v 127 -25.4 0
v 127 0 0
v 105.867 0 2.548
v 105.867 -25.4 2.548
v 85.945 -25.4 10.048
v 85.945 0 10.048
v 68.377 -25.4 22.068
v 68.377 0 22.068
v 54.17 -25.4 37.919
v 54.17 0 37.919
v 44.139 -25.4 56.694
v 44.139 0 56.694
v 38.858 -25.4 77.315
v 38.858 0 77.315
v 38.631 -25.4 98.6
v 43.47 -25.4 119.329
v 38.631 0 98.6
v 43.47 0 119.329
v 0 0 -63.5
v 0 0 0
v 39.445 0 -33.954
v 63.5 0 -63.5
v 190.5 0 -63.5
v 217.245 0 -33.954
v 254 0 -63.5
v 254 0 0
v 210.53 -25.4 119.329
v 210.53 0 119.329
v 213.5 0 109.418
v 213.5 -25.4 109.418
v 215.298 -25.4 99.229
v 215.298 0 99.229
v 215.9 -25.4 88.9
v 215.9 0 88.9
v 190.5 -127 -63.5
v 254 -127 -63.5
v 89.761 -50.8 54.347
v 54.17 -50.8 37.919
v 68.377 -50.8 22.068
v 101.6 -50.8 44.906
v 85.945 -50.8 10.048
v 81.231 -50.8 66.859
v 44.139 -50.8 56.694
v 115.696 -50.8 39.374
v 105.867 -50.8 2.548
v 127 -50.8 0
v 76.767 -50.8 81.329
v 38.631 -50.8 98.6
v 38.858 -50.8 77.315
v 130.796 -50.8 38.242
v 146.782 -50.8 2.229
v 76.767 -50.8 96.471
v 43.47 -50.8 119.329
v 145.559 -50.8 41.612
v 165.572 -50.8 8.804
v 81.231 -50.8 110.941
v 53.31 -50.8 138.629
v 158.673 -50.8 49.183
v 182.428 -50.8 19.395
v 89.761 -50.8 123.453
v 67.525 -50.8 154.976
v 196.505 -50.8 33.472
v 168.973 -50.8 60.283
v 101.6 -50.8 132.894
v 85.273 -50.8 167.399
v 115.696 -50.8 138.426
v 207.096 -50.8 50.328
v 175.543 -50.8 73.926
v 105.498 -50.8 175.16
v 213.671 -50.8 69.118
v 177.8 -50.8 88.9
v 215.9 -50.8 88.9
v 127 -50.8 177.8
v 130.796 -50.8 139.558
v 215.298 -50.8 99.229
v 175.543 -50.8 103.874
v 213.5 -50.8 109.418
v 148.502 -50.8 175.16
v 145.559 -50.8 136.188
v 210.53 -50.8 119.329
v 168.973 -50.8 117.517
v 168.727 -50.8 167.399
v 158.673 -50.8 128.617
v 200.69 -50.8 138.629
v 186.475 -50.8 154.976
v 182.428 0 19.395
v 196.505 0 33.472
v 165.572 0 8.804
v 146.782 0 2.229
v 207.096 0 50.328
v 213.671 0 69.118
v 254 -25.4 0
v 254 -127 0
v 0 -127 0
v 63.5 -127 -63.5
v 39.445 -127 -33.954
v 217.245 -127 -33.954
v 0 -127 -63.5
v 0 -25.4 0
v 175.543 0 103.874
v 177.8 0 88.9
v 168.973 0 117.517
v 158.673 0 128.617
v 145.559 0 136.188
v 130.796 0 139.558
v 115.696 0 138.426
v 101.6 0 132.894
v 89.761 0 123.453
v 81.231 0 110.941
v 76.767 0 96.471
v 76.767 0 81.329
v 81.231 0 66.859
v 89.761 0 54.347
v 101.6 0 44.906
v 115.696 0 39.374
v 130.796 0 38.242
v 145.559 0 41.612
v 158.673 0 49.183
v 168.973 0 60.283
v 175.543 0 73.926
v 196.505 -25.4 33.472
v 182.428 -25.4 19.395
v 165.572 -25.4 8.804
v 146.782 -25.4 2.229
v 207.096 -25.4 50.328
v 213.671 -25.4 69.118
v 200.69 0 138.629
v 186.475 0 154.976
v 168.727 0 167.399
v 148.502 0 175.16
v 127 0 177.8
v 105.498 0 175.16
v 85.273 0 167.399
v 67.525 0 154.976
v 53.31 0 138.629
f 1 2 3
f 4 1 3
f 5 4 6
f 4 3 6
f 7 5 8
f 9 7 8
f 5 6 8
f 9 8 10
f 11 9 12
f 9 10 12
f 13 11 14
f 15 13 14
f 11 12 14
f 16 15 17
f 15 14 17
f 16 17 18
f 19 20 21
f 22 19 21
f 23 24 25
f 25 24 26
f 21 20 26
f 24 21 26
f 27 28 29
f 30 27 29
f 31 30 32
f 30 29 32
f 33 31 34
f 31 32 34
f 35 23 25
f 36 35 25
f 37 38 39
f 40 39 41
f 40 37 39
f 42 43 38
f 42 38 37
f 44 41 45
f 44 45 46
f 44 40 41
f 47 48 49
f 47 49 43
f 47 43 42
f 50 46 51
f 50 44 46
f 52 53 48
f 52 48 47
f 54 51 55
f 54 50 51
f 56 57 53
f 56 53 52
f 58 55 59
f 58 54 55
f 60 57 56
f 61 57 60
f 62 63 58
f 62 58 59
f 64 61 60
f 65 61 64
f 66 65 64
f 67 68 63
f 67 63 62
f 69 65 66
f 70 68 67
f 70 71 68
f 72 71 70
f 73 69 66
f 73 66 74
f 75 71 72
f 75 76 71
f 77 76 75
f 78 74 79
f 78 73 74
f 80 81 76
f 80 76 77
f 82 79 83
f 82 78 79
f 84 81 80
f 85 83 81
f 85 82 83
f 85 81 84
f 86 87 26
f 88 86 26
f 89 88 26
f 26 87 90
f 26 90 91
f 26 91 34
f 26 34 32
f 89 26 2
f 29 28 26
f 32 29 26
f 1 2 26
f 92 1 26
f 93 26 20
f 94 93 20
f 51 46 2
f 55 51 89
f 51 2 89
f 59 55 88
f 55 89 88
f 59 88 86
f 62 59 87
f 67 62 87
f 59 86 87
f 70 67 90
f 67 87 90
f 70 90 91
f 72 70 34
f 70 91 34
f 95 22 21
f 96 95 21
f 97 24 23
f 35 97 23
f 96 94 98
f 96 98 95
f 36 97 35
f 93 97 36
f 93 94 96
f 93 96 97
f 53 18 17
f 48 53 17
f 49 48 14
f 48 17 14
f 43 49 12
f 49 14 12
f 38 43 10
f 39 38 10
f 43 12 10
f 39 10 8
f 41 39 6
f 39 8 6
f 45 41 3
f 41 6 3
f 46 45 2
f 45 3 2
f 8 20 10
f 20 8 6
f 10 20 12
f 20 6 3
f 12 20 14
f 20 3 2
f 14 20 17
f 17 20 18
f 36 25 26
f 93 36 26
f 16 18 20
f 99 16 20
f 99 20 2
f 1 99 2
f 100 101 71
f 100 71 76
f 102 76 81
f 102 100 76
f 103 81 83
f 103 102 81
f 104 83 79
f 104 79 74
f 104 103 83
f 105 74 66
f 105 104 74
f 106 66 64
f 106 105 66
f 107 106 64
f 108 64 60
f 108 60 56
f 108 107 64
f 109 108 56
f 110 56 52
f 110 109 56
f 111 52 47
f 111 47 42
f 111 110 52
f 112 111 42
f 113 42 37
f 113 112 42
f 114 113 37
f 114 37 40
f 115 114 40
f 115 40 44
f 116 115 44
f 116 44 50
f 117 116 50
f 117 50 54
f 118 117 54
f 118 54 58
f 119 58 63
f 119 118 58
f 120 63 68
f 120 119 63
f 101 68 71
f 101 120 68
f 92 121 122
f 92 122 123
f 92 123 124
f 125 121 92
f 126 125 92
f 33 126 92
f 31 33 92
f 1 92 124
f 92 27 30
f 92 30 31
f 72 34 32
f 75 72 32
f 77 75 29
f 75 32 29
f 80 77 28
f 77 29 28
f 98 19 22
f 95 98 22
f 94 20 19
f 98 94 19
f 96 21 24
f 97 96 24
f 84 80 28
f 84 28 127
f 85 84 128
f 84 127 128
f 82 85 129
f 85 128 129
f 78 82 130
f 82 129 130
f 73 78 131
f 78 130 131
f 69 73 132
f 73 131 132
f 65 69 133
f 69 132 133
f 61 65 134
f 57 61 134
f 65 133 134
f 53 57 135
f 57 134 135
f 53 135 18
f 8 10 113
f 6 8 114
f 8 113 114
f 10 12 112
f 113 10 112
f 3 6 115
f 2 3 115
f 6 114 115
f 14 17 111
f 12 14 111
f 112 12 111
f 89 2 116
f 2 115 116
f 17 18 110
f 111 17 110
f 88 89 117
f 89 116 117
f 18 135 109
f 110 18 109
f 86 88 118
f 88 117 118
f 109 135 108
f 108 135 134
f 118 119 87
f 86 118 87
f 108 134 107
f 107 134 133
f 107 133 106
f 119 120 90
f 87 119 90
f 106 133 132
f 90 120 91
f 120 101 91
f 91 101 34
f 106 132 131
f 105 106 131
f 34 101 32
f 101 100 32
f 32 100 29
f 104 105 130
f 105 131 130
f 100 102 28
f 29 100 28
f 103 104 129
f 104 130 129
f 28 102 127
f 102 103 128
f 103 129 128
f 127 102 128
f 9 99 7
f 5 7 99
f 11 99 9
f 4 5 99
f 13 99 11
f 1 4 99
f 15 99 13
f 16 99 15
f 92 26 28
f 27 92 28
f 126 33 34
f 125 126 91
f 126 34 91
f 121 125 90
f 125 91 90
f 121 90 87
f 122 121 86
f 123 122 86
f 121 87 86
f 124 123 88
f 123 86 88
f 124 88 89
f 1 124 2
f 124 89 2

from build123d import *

# Parameters (mm, degrees)
F1_DEPTH = 25.4
F2_DEPTH = 127
F0_R     = 50.8
F3_DEPTH = 50.8


with BuildPart() as f1:
    # F0 (on Front) → F1 (new body)
    with BuildSketch(Plane.XZ):
        with BuildLine():
            Line((43.469799, 119.328859), (0, 0))
            Line((0, 0), (127, 0))
            ThreePointArc((127, 0), (54.170282, 37.919198), (43.469799, 119.328859))
        make_face()
        with BuildLine():
            ThreePointArc((215.9, 88.9), (189.861793, 26.038207), (127, 0))
            Line((127, 0), (254, 0))
            Line((254, 0), (210.530201, 119.328859))
            ThreePointArc((210.530201, 119.328859), (214.547258, 104.349516), (215.9, 88.9))
        make_face()
    extrude(amount=F1_DEPTH)


with BuildPart() as f2:
    # F0 (on Front) → F2 (new body)
    with BuildSketch(Plane.XZ):
        Polygon((127, 0), (0, 0), (0, -63.5), (63.5, -63.5), (39.444682, -33.954244), (217.244682, -33.954244), (190.5, -63.5), (254, -63.5), (254, 0), align=None)
    extrude(amount=F2_DEPTH)


with BuildPart() as f3:
    # F0 (on Front) → F3 (new body)
    with BuildSketch(Plane.XZ):
        with BuildLine():
            ThreePointArc((43.469799, 119.328859), (54.170282, 37.919198), (127, 0))
            ThreePointArc((127, 0), (189.861793, 26.038207), (215.9, 88.9))
            ThreePointArc((215.9, 88.9), (214.547258, 104.349516), (210.530201, 119.328859))
            ThreePointArc((210.530201, 119.328859), (127, 177.8), (43.469799, 119.328859))
        make_face()
        with Locations((127, 88.9)):
            Circle(F0_R, mode=Mode.SUBTRACT)
    extrude(amount=F3_DEPTH)


solid = Compound([f1.part, f2.part, f3.part])
